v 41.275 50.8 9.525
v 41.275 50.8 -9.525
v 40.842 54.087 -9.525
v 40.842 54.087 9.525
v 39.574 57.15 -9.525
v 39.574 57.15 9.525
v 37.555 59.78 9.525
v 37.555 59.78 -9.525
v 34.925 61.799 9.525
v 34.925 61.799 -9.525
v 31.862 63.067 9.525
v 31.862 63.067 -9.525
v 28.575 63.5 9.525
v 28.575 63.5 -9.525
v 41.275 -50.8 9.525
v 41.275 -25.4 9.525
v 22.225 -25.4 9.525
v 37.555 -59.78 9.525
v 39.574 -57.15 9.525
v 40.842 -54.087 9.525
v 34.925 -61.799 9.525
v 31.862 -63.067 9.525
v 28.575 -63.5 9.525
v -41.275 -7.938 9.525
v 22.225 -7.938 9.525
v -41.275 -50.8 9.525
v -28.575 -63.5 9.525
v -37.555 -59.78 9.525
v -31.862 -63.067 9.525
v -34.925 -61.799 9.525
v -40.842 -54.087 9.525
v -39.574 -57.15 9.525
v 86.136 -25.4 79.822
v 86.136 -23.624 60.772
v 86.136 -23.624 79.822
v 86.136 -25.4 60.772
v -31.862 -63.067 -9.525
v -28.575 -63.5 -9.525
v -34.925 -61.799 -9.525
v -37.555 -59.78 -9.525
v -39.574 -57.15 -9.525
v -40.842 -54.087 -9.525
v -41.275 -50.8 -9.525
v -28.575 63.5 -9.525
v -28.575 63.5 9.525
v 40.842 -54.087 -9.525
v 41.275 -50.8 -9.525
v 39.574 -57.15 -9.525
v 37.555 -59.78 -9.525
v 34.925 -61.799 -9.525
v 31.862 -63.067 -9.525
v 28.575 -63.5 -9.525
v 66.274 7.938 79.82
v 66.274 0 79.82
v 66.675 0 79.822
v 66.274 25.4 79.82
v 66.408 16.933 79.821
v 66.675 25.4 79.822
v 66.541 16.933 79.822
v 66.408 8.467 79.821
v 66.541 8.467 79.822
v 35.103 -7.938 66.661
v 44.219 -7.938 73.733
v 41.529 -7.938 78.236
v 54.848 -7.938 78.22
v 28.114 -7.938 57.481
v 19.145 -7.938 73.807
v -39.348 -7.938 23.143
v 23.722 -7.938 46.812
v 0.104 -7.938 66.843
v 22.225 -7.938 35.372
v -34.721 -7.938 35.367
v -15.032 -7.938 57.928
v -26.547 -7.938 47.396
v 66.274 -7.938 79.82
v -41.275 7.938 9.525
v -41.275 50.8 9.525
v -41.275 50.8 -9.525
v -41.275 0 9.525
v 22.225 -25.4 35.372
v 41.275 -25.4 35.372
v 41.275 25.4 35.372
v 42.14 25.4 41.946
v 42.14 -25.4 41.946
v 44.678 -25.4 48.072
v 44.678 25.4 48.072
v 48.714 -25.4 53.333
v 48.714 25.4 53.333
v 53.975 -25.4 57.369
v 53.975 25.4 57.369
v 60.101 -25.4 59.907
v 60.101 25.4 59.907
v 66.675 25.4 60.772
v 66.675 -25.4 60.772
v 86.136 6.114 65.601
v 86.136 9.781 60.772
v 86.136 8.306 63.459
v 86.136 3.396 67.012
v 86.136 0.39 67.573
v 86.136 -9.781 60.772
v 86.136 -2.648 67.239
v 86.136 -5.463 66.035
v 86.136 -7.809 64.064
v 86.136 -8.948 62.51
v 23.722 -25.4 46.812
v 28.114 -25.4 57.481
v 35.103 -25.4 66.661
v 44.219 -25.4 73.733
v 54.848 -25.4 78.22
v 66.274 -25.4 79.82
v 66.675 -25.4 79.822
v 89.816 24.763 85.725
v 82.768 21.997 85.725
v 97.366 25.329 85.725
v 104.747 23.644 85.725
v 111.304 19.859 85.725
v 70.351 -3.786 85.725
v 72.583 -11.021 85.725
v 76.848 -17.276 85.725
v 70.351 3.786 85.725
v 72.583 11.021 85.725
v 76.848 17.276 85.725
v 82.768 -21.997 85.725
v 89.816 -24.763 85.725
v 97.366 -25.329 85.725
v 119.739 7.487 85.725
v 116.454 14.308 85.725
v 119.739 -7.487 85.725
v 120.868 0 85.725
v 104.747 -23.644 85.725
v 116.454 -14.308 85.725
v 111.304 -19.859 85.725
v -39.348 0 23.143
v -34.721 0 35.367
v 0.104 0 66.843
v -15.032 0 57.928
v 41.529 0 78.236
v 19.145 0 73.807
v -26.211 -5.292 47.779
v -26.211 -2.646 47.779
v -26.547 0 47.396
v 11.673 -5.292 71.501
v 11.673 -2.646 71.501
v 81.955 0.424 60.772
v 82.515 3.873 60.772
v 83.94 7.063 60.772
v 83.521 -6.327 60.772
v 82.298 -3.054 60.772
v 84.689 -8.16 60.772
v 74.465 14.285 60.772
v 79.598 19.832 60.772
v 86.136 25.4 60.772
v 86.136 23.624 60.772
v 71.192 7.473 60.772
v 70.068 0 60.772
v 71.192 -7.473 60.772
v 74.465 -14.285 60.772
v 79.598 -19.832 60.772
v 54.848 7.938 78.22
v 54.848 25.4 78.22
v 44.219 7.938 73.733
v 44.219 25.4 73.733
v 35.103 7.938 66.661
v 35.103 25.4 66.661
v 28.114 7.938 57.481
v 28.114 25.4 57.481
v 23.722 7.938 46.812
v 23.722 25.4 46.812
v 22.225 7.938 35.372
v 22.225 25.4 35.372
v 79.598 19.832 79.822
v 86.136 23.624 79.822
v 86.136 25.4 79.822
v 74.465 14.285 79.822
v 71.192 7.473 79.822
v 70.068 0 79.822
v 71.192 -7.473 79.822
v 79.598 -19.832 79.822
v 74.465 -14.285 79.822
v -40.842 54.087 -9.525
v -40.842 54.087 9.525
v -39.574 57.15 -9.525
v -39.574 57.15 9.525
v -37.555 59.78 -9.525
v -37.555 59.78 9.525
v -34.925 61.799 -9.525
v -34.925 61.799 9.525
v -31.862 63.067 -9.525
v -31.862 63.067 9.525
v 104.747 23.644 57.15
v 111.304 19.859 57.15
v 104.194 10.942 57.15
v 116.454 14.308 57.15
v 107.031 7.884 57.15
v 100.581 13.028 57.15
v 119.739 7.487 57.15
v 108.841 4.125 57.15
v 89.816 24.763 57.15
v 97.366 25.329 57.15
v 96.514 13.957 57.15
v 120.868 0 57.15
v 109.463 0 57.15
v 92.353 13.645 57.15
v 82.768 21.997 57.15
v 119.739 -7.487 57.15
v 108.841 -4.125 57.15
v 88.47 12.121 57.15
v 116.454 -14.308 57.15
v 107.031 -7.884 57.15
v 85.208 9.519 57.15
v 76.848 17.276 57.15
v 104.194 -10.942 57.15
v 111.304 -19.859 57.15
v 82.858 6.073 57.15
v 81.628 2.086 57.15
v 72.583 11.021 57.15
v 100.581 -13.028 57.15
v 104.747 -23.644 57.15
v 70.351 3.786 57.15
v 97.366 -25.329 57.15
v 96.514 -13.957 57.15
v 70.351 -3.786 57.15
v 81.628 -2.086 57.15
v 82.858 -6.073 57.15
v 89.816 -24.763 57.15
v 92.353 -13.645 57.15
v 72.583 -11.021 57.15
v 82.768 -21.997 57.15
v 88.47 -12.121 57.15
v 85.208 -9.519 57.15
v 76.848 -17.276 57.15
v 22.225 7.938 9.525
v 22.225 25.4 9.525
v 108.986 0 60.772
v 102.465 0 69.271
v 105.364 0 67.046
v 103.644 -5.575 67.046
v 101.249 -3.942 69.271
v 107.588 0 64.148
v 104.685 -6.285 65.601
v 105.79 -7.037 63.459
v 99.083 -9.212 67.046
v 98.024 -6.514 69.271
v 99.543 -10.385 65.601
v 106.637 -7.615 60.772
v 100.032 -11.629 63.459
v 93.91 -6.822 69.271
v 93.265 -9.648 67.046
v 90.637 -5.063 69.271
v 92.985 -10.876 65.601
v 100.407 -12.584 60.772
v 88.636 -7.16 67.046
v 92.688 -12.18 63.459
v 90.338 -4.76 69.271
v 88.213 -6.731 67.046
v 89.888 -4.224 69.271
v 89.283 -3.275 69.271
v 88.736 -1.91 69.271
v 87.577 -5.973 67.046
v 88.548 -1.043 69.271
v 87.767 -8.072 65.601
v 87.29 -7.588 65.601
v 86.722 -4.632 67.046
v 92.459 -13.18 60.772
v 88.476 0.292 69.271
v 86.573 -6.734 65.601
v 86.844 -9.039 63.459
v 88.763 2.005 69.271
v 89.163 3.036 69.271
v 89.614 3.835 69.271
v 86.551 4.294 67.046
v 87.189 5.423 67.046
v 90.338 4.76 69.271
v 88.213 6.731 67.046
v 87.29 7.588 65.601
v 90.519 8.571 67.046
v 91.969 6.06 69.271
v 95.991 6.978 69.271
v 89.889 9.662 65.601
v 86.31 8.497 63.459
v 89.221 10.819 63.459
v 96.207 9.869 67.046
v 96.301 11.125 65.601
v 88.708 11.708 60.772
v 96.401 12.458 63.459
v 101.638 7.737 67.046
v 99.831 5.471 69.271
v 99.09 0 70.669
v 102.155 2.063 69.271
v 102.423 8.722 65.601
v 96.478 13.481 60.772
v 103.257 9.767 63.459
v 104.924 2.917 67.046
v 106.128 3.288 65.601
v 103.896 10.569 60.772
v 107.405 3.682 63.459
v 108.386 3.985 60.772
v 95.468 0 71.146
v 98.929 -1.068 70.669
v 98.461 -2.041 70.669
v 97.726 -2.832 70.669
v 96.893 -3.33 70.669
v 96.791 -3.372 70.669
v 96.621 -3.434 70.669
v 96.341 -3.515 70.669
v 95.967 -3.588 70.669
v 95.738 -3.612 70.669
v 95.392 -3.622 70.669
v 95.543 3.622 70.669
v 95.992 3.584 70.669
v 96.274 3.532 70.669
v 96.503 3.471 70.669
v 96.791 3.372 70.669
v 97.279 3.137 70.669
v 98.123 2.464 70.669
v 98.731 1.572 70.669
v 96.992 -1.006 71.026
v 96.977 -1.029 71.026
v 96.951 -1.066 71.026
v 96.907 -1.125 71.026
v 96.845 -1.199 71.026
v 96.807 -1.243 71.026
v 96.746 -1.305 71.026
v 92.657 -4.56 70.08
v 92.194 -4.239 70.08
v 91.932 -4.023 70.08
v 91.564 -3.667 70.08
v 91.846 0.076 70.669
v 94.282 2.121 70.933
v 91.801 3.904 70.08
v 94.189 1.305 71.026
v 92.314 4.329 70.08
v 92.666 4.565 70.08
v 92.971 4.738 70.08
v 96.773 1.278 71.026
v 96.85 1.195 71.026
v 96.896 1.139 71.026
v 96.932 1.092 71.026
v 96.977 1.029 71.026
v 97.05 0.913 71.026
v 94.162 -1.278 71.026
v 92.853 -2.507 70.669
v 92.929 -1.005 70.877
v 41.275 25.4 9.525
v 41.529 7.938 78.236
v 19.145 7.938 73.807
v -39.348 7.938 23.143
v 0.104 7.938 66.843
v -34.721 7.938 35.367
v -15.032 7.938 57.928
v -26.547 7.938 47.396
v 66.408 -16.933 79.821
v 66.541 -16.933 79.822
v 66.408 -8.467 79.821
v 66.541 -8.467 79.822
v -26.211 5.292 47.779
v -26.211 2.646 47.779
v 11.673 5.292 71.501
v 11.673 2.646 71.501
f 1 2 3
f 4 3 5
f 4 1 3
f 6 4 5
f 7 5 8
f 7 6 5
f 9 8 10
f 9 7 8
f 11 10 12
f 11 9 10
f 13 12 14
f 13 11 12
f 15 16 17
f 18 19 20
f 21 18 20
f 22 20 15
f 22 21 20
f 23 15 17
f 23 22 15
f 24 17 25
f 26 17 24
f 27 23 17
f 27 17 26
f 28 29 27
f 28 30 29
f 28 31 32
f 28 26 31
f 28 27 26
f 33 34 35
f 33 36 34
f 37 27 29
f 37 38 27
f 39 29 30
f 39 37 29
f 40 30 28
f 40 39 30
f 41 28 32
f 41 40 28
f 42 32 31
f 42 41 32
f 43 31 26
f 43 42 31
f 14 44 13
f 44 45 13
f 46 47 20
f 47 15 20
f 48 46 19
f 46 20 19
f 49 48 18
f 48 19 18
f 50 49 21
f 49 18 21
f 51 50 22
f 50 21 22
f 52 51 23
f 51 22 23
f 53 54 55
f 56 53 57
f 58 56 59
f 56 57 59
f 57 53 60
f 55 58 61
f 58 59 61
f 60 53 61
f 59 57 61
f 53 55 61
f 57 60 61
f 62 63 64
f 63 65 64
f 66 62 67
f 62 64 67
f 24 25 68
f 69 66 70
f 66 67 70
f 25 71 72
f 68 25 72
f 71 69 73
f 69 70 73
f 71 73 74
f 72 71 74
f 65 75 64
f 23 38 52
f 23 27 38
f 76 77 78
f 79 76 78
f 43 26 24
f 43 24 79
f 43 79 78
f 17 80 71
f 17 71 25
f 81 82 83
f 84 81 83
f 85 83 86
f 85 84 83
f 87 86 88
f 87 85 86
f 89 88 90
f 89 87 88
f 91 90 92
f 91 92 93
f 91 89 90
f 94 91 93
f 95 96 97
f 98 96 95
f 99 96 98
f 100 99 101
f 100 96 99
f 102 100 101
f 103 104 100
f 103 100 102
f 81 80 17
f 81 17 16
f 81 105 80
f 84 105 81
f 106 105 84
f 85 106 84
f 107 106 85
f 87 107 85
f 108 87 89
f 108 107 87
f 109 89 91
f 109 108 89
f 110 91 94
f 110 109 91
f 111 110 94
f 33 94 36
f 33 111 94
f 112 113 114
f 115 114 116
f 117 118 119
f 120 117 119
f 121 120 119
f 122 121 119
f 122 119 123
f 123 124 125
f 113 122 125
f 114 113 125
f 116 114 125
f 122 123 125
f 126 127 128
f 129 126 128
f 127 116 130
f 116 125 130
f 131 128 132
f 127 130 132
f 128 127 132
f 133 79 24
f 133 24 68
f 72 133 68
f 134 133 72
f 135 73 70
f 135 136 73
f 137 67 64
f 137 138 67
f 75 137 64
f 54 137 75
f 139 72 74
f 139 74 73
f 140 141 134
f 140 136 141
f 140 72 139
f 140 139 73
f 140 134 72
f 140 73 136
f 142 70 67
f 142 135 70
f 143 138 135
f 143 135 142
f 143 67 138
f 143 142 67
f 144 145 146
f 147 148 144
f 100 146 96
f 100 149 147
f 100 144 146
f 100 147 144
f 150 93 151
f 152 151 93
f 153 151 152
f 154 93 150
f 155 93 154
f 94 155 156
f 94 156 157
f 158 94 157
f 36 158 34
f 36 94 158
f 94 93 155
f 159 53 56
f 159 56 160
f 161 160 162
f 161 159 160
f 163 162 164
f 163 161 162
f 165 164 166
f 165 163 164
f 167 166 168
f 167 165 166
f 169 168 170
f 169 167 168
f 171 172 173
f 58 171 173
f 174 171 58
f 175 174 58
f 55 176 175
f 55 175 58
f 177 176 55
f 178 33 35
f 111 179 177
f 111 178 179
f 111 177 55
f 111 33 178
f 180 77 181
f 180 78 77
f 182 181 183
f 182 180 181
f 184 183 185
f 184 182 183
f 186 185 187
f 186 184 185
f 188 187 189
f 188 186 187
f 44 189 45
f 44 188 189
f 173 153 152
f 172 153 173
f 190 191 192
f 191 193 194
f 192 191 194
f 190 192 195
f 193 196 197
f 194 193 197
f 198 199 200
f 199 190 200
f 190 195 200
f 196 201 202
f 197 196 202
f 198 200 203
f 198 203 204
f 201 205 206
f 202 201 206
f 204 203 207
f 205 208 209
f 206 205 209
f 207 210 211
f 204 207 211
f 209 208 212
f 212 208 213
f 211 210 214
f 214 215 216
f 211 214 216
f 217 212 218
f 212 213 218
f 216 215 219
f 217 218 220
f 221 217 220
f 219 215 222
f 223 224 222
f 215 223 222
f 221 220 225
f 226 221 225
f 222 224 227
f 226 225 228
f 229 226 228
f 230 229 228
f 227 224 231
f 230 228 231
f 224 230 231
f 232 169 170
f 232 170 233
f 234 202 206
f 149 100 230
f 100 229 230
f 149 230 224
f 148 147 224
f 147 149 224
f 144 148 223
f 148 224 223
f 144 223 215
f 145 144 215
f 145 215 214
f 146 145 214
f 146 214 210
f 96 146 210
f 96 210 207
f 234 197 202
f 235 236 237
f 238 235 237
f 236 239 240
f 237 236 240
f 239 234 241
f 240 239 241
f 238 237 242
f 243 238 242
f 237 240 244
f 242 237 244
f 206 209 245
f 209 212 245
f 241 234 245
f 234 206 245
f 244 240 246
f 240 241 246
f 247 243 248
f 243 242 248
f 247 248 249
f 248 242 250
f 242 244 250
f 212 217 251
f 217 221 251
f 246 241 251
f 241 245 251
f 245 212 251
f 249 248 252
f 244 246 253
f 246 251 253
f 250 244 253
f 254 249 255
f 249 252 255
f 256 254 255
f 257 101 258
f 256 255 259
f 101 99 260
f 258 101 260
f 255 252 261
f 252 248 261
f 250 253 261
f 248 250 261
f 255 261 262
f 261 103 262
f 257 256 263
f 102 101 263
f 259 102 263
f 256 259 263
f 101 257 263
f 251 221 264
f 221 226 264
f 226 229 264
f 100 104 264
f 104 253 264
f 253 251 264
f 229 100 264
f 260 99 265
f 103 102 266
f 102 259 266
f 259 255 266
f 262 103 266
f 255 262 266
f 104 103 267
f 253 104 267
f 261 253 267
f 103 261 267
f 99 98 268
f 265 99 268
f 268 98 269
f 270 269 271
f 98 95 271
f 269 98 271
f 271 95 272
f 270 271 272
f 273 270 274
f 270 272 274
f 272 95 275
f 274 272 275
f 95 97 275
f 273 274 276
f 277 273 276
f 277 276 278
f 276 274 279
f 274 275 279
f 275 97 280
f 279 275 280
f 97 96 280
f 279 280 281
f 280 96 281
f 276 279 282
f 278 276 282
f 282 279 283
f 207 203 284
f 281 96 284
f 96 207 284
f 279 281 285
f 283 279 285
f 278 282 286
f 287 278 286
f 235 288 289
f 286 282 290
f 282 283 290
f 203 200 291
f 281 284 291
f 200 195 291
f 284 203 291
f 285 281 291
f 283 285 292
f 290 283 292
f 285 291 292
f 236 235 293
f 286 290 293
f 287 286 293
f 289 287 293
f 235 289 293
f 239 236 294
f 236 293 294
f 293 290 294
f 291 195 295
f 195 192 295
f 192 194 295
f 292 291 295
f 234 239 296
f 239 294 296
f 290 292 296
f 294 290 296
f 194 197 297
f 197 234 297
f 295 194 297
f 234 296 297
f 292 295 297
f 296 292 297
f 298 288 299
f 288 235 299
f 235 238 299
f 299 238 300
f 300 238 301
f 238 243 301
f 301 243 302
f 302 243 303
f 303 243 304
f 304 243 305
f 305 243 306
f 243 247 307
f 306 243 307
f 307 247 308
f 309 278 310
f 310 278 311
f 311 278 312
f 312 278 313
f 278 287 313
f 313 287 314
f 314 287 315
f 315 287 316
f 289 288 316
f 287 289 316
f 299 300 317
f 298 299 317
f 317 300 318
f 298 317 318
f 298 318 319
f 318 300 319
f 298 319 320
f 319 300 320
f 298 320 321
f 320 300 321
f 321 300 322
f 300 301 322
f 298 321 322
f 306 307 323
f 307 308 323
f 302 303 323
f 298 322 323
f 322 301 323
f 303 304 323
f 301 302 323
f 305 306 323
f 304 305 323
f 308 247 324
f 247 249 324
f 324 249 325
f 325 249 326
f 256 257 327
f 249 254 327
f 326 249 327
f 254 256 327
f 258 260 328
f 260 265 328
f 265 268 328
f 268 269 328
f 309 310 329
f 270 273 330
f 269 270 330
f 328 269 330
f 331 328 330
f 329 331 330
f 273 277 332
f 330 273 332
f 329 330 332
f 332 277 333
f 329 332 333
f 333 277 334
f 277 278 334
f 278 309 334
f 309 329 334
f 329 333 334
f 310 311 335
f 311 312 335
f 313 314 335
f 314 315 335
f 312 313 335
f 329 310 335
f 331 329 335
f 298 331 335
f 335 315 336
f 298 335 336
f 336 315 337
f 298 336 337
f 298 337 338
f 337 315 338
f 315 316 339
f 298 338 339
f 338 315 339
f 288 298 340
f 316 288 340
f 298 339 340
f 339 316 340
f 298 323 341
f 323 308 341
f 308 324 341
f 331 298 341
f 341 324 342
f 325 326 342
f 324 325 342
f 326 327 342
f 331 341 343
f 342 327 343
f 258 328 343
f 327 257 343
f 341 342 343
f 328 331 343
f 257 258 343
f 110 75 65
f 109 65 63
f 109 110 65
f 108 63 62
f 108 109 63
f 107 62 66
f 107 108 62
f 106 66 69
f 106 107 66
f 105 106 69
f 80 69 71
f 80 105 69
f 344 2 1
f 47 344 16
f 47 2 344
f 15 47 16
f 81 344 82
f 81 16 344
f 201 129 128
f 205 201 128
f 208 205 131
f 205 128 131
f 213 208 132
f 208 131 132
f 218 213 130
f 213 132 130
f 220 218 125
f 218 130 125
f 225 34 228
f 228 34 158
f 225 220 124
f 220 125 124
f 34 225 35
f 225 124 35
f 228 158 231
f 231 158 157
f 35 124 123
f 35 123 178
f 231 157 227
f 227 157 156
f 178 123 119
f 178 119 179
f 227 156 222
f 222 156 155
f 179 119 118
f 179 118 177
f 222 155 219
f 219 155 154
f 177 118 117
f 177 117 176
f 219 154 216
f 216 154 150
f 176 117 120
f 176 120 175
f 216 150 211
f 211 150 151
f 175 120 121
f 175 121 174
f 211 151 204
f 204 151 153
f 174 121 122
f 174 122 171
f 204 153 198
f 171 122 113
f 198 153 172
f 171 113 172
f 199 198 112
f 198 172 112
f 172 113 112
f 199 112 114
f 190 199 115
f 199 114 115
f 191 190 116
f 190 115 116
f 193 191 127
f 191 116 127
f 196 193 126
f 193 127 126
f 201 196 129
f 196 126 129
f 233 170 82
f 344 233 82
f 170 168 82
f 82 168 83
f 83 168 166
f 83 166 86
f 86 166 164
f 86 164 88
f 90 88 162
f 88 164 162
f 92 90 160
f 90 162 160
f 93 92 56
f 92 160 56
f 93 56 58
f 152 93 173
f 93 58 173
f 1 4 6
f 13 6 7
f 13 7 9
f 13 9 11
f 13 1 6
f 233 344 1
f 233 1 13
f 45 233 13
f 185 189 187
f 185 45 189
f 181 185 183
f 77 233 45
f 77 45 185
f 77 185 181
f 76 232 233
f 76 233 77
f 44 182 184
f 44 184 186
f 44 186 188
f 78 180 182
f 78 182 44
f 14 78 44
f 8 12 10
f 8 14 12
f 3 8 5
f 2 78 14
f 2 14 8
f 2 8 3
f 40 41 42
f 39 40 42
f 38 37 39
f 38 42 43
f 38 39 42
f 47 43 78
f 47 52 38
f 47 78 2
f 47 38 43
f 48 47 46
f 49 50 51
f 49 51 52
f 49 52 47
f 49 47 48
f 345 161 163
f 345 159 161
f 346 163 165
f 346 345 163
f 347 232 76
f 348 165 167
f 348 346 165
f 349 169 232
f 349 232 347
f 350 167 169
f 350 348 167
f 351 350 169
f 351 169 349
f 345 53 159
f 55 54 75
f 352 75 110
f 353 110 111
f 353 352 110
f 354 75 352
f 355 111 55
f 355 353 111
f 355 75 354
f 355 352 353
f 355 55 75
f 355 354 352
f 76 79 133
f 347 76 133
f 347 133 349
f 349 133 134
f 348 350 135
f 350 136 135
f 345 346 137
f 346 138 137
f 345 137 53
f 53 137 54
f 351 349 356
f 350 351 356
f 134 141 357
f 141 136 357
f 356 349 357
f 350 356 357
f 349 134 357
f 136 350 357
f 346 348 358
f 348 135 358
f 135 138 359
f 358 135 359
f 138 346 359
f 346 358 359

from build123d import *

# Parameters (mm, degrees)
F1_DEPTH = 63.5
F0_W     = 16.068018
F0_H     = 19.05
F2_DEPTH = 25.4
F3_DEPTH = 7.9375
F5_R     = 12.7


with BuildPart() as f1:
    # F0 (on Front) → F1 (new body, symmetric)
    with BuildSketch(Plane.XZ):
        Polygon((22.225, 9.525), (-41.275, 9.525), (-41.275, -9.525), (41.275, -9.525), (41.275, 9.525), align=None)
    extrude(amount=F1_DEPTH, both=True)

    # F0 (on Front) → F2 (join, symmetric)
    with BuildSketch(Plane.XZ):
        with BuildLine():
            Line((22.225, 35.372035), (22.225, 9.525))
            Line((22.225, 9.525), (41.275, 9.525))
            Line((41.275, 9.525), (41.275, 35.372035))
            ThreePointArc((41.275, 35.372035), (48.714488, 53.332548), (66.675, 60.772035))
            Line((66.675, 60.772035), (70.067601, 60.772035))
            Line((70.067601, 60.772035), (70.067601, 79.822035))
            Line((70.067601, 79.822035), (66.675, 79.822035))
            add(Edge.make_bspline(
                [(66.274157, 79.820228), (66.407695, 79.820948), (66.541309, 79.82155), (66.675, 79.822035)],
                knots=[128.53936, 128.53936, 128.53936, 128.53936, 128.8211, 128.8211, 128.8211, 128.8211], degree=3))
            ThreePointArc((66.274157, 79.820228), (35.102702, 66.660891), (22.225, 35.372035))
        make_face()
        with Locations((78.10161, 70.297035)):
            Rectangle(F0_W, F0_H)
    extrude(amount=F2_DEPTH, both=True)

    # F0 (on Front) → F3 (join, symmetric)
    with BuildSketch(Plane.XZ):
        with BuildLine():
            add(Edge.make_bspline(
                [(-41.275, 9.525), (-39.656203, 54.754084), (5.349448, 79.491852), (66.274157, 79.820228)],
                knots=[0, 0, 0, 0, 128.53936, 128.53936, 128.53936, 128.53936], degree=3))
            Line((-41.275, 9.525), (22.225, 9.525))
            Line((22.225, 9.525), (22.225, 35.372035))
            ThreePointArc((22.225, 35.372035), (35.102702, 66.660891), (66.274157, 79.820228))
        make_face()
    extrude(amount=F3_DEPTH, both=True)

    # F0 (on Front) → F4 (revolve)
    with BuildSketch(Plane.XZ):
        with BuildLine():
            Line((120.867601, 85.725), (95.467601, 85.725))
            Line((95.467601, 85.725), (95.467601, 71.4375))
            Line((95.467601, 71.4375), (95.467601, 71.145688))
            ThreePointArc((95.467601, 71.145688), (105.364047, 67.046446), (109.463289, 57.15))
            Line((109.463289, 57.15), (120.867601, 57.15))
            Line((120.867601, 57.15), (120.867601, 85.725))
        make_face()
    revolve(axis=Axis((95.467601, 0, 71.4375), (0, 0, -1)))

    # F5
    f5_edges = [f1.edges().sort_by_distance(p)[0] for p in [
        (-41.275, -63.5, 0),
        (41.275, -63.5, 0),
        (41.275, 63.5, 0),
        (-41.275, 63.5, 0),
    ]]
    fillet(f5_edges, radius=F5_R)


solid = f1.part
